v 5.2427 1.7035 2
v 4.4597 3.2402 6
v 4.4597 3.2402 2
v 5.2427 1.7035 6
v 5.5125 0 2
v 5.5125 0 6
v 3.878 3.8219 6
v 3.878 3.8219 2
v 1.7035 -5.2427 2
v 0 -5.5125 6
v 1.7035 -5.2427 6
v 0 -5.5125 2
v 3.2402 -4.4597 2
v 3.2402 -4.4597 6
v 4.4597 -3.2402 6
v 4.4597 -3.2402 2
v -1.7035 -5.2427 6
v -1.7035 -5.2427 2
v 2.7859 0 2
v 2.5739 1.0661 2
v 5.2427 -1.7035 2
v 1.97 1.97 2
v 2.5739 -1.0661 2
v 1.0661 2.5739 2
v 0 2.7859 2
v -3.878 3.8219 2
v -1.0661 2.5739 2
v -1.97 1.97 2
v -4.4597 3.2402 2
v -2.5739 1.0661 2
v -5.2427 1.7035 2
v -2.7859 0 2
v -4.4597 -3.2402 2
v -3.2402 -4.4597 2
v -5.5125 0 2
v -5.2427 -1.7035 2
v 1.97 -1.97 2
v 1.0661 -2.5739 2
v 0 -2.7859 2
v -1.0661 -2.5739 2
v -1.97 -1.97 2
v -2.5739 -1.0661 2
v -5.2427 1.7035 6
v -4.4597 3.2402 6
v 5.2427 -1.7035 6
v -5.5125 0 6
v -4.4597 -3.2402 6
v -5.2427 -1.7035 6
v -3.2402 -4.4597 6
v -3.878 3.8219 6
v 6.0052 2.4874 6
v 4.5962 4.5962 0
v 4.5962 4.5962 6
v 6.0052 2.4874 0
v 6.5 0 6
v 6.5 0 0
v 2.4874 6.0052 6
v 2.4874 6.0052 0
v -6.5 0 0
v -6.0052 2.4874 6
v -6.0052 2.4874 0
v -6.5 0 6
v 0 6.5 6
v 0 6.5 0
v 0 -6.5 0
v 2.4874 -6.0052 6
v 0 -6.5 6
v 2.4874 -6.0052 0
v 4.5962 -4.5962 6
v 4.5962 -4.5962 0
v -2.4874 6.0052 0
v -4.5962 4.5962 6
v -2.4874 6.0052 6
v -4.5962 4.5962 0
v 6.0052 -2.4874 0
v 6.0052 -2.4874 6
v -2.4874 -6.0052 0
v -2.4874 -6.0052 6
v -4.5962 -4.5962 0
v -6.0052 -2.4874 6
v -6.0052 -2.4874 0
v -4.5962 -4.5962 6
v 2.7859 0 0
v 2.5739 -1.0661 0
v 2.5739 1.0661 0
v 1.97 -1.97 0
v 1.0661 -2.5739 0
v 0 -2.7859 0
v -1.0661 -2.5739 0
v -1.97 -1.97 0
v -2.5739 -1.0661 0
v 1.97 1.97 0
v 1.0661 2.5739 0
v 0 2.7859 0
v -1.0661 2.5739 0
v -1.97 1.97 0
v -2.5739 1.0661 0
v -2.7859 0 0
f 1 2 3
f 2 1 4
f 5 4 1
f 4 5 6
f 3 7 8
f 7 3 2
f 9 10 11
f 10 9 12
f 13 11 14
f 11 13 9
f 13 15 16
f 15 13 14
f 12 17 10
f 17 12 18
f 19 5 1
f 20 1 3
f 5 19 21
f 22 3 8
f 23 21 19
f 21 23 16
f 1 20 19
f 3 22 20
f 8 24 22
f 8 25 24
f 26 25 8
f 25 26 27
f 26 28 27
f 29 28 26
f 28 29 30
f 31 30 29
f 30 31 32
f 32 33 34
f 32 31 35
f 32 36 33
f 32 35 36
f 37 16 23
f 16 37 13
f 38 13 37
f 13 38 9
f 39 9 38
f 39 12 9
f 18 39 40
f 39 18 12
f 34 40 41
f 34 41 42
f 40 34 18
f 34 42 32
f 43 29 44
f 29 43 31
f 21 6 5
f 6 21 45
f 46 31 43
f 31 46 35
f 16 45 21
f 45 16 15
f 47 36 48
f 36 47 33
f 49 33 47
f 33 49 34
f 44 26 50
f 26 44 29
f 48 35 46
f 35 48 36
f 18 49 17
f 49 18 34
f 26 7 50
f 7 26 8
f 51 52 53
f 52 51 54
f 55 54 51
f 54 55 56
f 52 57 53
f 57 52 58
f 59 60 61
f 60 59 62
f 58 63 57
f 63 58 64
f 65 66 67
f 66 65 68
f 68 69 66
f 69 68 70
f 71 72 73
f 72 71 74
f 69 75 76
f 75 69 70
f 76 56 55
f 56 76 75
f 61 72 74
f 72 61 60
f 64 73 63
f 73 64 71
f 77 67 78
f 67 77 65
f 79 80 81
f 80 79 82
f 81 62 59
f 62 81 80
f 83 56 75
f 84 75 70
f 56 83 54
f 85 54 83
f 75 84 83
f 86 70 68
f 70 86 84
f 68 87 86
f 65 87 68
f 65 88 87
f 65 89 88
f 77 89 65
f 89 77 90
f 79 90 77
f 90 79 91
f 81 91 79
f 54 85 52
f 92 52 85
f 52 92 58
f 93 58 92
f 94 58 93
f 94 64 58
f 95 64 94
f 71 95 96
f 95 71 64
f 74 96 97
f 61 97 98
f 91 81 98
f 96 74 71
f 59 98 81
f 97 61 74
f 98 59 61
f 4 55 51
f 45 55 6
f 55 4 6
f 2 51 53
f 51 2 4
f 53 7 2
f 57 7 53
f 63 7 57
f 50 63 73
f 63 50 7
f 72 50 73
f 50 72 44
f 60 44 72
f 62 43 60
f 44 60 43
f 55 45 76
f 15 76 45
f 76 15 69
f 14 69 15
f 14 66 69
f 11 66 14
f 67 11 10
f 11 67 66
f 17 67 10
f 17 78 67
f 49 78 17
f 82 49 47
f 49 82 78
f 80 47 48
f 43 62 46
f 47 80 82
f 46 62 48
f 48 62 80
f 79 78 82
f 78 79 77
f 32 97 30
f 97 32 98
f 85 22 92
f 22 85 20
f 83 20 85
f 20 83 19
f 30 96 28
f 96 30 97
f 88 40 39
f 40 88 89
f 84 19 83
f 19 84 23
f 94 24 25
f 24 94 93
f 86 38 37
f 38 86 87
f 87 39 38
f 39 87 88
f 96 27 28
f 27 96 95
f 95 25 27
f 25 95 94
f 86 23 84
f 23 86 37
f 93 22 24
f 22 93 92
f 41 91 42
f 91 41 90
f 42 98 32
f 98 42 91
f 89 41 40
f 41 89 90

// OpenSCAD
// file: my_core.scad
inch = 25.4; // conversion factor

$fn=16;

threadwidth = 0.4;
tgap = 2*threadwidth;

core_h = 8;
flange_h = 4;

module core_footprint(tolerance=0.25) {
  difference() {
    union() {
      cylinder(r=3/8*inch/2+tolerance, h=core_h, $fn=20);
      translate([0,0,core_h-flange_h]) cylinder(h=flange_h, r1=3/8*inch/2+tolerance-0.5, r2=7/16*inch/2-0.5+tolerance, $fn=20);
    }

    translate([-1*inch,9/64*inch+0.25,-1]) cube([2*inch,2*inch,core_h+2]);
  }
}


module my_core() {

difference() {
  core_footprint(0);

  // hole
  translate([0,0,-1]) cylinder(r=9/64*inch/2+0.75, h=core_h+2);

  // central D
  translate([0,0,core_h-5/64*inch])
    difference() {
    cylinder(r=1/4*inch/2+0.5, h=5/64*inch + 1);
    translate([-1*inch, 3/32*inch+0.125, 0]) cube([2*inch, 2*inch, 3/64*inch]);
  }
}


}

my_core();
// main file
inch = 25.4; // conversion factor

$fn=16;

threadwidth = 0.4;
tgap = 2*threadwidth;

core_h = 9.5;
flange_h = 4;

use <my_core.scad>;


module my_inner_flange() {
difference() {
  cylinder(h=6, r=6.5);
  translate([0,0,2])  core_footprint(0.75);
  translate([0,0,-1]) cylinder(r=9/64*inch/2+1, h=core_h+2);
}
}

my_inner_flange();
